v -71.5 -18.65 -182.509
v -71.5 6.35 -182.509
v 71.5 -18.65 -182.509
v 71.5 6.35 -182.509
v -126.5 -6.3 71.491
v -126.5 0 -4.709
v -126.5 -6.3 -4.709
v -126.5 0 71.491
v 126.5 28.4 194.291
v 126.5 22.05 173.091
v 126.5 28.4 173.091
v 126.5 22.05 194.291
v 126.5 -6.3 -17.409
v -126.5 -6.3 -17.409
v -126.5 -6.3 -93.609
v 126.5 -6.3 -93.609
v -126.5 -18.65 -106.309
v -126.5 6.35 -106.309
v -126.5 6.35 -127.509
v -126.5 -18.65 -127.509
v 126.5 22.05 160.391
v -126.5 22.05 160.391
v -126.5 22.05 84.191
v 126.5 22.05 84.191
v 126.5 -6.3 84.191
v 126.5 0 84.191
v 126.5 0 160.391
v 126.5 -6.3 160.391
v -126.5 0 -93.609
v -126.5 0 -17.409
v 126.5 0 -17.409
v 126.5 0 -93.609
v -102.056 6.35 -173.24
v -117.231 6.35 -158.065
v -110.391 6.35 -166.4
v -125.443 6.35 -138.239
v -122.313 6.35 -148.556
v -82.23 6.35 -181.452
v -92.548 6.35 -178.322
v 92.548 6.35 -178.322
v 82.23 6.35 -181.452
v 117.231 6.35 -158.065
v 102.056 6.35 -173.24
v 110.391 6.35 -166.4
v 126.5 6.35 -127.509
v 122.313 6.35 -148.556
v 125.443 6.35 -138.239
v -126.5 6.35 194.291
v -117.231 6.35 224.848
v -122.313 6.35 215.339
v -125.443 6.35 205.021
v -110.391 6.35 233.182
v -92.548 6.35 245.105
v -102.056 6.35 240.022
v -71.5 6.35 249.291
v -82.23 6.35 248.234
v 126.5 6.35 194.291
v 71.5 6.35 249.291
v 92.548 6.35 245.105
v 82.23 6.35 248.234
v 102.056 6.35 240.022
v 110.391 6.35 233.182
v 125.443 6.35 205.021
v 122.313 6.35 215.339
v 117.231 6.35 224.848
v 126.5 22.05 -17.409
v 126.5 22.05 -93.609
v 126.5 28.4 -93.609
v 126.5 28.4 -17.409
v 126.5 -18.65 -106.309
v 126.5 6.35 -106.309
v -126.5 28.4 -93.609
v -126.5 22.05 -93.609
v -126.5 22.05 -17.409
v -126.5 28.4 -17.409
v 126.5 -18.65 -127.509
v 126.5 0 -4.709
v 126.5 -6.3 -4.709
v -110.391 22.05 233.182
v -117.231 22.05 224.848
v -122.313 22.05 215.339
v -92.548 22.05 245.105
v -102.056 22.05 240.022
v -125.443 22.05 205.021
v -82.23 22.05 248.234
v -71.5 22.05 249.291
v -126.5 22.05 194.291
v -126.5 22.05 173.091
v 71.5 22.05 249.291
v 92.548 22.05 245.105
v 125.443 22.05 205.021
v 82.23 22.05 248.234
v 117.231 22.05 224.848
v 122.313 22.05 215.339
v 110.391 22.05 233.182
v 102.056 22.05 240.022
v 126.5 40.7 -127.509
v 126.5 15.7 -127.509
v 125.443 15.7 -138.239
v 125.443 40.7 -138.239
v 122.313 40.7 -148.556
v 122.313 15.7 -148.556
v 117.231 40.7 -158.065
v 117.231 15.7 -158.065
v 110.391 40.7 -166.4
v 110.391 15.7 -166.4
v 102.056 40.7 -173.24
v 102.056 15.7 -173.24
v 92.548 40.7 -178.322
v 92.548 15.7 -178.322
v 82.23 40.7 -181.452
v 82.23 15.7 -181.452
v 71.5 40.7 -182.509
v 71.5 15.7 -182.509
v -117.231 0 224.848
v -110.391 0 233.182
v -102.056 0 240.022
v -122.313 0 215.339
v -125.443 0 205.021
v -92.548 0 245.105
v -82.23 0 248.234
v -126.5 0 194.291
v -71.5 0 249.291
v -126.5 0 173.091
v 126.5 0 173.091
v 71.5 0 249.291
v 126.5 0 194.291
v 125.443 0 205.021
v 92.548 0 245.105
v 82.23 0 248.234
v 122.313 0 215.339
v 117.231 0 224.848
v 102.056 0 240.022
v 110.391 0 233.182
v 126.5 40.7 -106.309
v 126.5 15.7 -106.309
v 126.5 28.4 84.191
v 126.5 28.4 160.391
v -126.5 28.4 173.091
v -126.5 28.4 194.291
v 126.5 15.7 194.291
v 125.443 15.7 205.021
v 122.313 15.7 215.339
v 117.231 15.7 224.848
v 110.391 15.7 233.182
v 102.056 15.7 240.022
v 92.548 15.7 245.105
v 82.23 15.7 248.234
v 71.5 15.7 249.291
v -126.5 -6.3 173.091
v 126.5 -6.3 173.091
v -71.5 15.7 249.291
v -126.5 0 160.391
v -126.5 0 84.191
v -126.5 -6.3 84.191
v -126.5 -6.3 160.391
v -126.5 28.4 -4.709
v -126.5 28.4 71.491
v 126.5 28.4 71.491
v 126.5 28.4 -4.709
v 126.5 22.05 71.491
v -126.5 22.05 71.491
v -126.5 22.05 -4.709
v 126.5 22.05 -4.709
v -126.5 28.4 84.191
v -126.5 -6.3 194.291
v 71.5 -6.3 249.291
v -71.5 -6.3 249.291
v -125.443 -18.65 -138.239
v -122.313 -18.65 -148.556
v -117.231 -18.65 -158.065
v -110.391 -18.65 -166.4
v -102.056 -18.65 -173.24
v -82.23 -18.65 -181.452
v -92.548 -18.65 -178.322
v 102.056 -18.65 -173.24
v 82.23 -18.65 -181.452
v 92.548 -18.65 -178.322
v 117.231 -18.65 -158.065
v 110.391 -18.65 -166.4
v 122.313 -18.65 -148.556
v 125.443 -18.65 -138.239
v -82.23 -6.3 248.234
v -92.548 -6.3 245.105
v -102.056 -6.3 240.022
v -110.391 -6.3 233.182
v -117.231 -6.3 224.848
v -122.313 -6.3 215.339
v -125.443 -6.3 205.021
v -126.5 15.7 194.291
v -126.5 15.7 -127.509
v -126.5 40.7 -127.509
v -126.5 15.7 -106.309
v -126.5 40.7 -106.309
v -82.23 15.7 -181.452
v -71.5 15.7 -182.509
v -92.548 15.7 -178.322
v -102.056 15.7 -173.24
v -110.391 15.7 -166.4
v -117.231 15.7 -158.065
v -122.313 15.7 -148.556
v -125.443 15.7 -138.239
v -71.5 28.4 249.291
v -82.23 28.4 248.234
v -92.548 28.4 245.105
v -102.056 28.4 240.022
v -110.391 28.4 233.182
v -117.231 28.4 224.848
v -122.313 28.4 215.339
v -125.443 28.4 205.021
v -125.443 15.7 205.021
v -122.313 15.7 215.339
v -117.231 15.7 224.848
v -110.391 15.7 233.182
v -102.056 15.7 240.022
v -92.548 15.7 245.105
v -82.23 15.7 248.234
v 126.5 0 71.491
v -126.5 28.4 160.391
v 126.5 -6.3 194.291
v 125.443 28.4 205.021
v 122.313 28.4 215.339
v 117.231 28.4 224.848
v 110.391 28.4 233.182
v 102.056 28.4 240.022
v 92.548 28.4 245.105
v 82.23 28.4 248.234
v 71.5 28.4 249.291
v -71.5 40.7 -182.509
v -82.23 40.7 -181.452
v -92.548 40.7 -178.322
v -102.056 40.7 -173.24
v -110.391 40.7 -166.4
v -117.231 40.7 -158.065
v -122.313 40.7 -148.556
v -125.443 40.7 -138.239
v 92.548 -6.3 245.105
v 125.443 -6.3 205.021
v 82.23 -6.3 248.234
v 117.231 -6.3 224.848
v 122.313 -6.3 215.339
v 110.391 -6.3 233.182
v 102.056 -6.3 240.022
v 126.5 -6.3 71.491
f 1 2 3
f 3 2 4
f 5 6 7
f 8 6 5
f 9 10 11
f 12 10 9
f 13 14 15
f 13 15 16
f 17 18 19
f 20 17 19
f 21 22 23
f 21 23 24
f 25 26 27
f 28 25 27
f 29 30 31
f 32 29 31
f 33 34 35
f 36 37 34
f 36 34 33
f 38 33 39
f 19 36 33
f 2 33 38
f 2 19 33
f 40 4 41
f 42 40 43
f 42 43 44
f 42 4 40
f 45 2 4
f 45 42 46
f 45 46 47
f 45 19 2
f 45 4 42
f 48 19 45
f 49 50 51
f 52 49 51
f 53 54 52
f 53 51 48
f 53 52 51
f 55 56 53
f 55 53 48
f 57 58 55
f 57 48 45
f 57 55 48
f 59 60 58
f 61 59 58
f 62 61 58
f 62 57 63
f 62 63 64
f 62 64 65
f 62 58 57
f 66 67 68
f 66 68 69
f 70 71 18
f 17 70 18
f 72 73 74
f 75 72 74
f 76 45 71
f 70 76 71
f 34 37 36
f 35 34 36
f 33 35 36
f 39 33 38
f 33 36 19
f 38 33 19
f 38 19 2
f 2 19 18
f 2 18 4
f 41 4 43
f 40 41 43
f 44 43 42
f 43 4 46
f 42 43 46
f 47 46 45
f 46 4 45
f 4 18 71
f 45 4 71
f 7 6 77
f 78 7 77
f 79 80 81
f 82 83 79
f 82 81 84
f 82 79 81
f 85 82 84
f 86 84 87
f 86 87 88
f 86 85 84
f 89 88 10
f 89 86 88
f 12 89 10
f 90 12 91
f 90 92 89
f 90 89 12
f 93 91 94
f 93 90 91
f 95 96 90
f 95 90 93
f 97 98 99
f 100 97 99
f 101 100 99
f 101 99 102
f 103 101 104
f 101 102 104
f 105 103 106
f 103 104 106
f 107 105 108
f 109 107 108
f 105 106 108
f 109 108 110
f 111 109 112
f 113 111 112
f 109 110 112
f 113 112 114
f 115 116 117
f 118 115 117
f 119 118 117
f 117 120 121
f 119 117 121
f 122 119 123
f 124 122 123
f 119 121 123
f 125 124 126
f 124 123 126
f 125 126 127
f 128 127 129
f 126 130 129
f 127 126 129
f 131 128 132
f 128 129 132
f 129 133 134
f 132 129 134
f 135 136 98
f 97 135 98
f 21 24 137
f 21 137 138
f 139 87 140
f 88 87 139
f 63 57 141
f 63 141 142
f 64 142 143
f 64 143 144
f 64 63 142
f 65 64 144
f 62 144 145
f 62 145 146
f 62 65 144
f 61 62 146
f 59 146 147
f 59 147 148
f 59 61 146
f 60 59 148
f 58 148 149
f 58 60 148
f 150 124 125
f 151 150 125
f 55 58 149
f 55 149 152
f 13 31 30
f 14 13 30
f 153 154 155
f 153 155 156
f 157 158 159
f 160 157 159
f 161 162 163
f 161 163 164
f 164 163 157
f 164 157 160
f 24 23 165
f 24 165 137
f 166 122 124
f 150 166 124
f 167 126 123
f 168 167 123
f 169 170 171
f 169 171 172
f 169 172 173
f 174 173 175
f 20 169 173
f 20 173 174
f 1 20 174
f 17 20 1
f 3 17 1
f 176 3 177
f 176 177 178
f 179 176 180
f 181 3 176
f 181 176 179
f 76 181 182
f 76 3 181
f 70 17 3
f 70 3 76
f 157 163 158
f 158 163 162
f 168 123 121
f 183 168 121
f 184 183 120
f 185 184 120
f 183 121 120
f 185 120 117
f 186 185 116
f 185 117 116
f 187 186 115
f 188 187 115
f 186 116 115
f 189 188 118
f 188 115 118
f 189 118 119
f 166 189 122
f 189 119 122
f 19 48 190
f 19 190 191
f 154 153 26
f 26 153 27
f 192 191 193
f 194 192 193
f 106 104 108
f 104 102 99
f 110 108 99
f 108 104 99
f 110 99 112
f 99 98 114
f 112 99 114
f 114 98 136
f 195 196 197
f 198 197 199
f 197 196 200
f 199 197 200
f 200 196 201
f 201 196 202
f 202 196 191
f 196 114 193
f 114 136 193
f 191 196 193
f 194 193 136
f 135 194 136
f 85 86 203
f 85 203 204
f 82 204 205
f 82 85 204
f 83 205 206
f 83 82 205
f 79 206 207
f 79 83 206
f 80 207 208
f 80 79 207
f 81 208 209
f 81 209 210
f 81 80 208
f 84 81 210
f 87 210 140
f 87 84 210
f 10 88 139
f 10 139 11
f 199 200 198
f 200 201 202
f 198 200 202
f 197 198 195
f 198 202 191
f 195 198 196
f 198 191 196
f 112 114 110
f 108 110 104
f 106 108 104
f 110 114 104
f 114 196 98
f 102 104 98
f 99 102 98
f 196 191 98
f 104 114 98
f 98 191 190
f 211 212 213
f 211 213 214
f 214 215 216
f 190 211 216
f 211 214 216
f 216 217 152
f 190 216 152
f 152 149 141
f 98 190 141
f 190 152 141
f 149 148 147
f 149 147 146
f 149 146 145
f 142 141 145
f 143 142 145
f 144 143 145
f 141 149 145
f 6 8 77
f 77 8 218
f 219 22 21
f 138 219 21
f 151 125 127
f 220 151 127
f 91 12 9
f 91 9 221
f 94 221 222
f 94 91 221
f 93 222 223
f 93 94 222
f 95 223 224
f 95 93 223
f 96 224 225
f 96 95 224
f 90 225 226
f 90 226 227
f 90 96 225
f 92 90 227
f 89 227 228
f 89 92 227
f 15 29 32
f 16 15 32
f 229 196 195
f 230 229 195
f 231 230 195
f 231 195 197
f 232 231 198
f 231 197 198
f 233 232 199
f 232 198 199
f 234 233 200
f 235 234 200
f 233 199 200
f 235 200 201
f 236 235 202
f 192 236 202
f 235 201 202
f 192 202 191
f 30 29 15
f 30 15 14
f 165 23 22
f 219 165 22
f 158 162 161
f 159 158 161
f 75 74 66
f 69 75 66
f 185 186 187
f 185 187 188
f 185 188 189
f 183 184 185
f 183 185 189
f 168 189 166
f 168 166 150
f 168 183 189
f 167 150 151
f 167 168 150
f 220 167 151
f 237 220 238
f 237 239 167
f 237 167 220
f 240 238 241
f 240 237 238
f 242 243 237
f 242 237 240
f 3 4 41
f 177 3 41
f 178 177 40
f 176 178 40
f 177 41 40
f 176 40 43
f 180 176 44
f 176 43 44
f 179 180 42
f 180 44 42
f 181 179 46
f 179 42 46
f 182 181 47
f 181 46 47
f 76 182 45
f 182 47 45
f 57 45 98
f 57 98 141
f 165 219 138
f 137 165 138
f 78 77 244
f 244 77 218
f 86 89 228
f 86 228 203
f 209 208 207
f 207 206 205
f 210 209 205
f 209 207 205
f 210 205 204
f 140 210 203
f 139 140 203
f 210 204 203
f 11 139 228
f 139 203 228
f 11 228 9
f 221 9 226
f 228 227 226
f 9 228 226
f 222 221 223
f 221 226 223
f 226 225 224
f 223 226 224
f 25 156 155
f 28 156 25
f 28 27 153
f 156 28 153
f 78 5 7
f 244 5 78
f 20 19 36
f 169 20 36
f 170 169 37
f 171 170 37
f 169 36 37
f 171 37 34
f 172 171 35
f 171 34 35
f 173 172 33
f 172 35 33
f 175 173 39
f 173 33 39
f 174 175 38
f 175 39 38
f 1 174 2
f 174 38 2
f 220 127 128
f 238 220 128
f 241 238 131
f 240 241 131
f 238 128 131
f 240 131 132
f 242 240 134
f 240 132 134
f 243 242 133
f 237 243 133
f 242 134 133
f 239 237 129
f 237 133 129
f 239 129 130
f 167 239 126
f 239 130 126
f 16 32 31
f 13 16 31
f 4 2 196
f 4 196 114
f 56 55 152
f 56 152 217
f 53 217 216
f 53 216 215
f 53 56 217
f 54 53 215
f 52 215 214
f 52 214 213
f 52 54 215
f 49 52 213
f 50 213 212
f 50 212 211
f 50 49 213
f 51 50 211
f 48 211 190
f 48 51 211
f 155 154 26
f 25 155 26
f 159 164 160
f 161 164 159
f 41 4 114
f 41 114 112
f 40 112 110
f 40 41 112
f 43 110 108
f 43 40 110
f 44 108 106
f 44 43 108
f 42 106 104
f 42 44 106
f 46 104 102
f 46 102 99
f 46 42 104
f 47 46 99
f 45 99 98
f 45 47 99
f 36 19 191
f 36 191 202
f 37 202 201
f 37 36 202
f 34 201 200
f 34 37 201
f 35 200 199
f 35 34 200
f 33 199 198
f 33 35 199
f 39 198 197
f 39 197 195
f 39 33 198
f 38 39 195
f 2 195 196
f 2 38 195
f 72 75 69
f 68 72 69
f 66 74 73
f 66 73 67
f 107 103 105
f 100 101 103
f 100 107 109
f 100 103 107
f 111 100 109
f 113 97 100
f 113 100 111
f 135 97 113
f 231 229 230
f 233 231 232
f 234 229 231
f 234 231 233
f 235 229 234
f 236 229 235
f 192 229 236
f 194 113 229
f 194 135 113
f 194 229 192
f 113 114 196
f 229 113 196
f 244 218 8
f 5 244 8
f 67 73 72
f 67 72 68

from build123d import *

# Parameters (mm, degrees)
F3_W      = 126.5
F3_H      = 76.2
F4_DEPTH  = 6.3
F5_W      = 126.5
F5_H      = 12.7
F6_DEPTH  = 9.35
F7_W      = 253
F7_H      = 76.2
F8_DEPTH  = 6.35
F10_DEPTH = 25
F12_DEPTH = 25


with BuildPart() as f4:
    # F3 (on Front) → F4 (new body)
    with BuildSketch(Plane.XZ):
        with BuildLine():
            Line((71.5, 249.29121), (0, 249.29121))
            Line((0, 249.29121), (0, 173.09121))
            Line((0, 173.09121), (126.5, 173.09121))
            Line((126.5, 173.09121), (126.5, 194.29121))
            ThreePointArc((126.5, 194.29121), (110.390873, 233.182083), (71.5, 249.29121))
        make_face()
        with BuildLine():
            Line((0, 173.09121), (0, 249.29121))
            Line((0, 249.29121), (-71.5, 249.29121))
            ThreePointArc((-71.5, 249.29121), (-110.390873, 233.182083), (-126.5, 194.29121))
            Line((-126.5, 194.29121), (-126.5, 173.09121))
            Line((-126.5, 173.09121), (0, 173.09121))
        make_face()
        with Locations((-63.25, -55.50879)):
            Rectangle(F3_W, F3_H)
        with Locations((63.25, -55.50879)):
            Rectangle(F3_W, F3_H)
        with Locations((-63.25, 33.39121)):
            Rectangle(F3_W, F3_H)
        with Locations((63.25, 33.39121)):
            Rectangle(F3_W, F3_H)
        with Locations((-63.25, 122.29121)):
            Rectangle(F3_W, F3_H)
        with Locations((63.25, 122.29121)):
            Rectangle(F3_W, F3_H)
    extrude(amount=F4_DEPTH)


with BuildPart() as f6:
    # F5 (on offset) → F6 (new body)
    with BuildSketch(Plane.XZ.offset(-6.35)):
        with BuildLine():
            Line((0, 249.29121), (-71.5, 249.29121))
            ThreePointArc((-71.5, 249.29121), (-110.390873, 233.182083), (-126.5, 194.29121))
            Line((-126.5, 194.29121), (-126.5, -93.60879))
            Line((-126.5, -93.60879), (0, -93.60879))
            Line((0, -93.60879), (0, 249.29121))
        make_face()
        with BuildLine():
            Line((71.5, 249.29121), (0, 249.29121))
            Line((0, 249.29121), (0, -93.60879))
            Line((0, -93.60879), (126.5, -93.60879))
            Line((126.5, -93.60879), (126.5, 194.29121))
            ThreePointArc((126.5, 194.29121), (110.390873, 233.182083), (71.5, 249.29121))
        make_face()
        with Locations((-63.25, -99.95879)):
            Rectangle(F5_W, F5_H)
        with Locations((63.25, -99.95879)):
            Rectangle(F5_W, F5_H)
        with BuildLine():
            Line((0, -106.30879), (-126.5, -106.30879))
            Line((-126.5, -106.30879), (-126.5, -127.50879))
            ThreePointArc((-126.5, -127.50879), (-110.390873, -166.399663), (-71.5, -182.50879))
            Line((-71.5, -182.50879), (0, -182.50879))
            Line((0, -182.50879), (0, -106.30879))
        make_face()
        with BuildLine():
            Line((126.5, -106.30879), (0, -106.30879))
            Line((0, -106.30879), (0, -182.50879))
            Line((0, -182.50879), (71.5, -182.50879))
            ThreePointArc((71.5, -182.50879), (110.390873, -166.399663), (126.5, -127.50879))
            Line((126.5, -127.50879), (126.5, -106.30879))
        make_face()
    extrude(amount=-F6_DEPTH)


with BuildPart() as f8:
    # F7 (on offset) → F8 (new body)
    with BuildSketch(Plane.XZ.offset(-22.05)):
        with BuildLine():
            ThreePointArc((126.5, 194.29121), (110.390873, 233.182083), (71.5, 249.29121))
            Line((71.5, 249.29121), (-71.5, 249.29121))
            ThreePointArc((-71.5, 249.29121), (-110.390873, 233.182083), (-126.5, 194.29121))
            Line((-126.5, 194.29121), (-126.5, 173.09121))
            Line((-126.5, 173.09121), (126.5, 173.09121))
            Line((126.5, 173.09121), (126.5, 194.29121))
        make_face()
        with Locations((0, 122.29121)):
            Rectangle(F7_W, F7_H)
        with Locations((0, 33.39121)):
            Rectangle(F7_W, F7_H)
        with Locations((0, -55.50879)):
            Rectangle(F7_W, F7_H)
    extrude(amount=-F8_DEPTH)


with BuildPart() as f10:
    # F9 (on face) → F10 (new body)
    with BuildSketch(Plane.XZ.offset(-6.35)):
        with BuildLine():
            Line((-126.5, -106.30879), (-126.5, -127.50879))
            ThreePointArc((-126.5, -127.50879), (-110.390873, -166.399663), (-71.5, -182.50879))
            Line((-71.5, -182.50879), (0, -182.50879))
            Line((0, -182.50879), (0, -106.30879))
            Line((0, -106.30879), (-126.5, -106.30879))
        make_face()
        with BuildLine():
            Line((0, -106.30879), (0, -182.50879))
            Line((0, -182.50879), (71.5, -182.50879))
            ThreePointArc((71.5, -182.50879), (110.390873, -166.399663), (126.5, -127.50879))
            Line((126.5, -127.50879), (126.5, -106.30879))
            Line((126.5, -106.30879), (0, -106.30879))
        make_face()
    extrude(amount=F10_DEPTH)


with BuildPart() as f12:
    # F11 (on face) → F12 (new body)
    with BuildSketch(Plane(origin=(0, 15.7, 0), x_dir=(-1, 0, 0), z_dir=(0, 1, 0))):
        with BuildLine():
            Line((-126.5, -106.30879), (-126.5, -127.50879))
            ThreePointArc((-126.5, -127.50879), (-110.390873, -166.399663), (-71.5, -182.50879))
            Line((-71.5, -182.50879), (71.5, -182.50879))
            ThreePointArc((71.5, -182.50879), (110.390873, -166.399663), (126.5, -127.50879))
            Line((126.5, -127.50879), (126.5, -106.30879))
            Line((126.5, -106.30879), (-126.5, -106.30879))
        make_face()
    extrude(amount=F12_DEPTH)


solid = Compound([f4.part, f6.part, f8.part, f10.part, f12.part])
